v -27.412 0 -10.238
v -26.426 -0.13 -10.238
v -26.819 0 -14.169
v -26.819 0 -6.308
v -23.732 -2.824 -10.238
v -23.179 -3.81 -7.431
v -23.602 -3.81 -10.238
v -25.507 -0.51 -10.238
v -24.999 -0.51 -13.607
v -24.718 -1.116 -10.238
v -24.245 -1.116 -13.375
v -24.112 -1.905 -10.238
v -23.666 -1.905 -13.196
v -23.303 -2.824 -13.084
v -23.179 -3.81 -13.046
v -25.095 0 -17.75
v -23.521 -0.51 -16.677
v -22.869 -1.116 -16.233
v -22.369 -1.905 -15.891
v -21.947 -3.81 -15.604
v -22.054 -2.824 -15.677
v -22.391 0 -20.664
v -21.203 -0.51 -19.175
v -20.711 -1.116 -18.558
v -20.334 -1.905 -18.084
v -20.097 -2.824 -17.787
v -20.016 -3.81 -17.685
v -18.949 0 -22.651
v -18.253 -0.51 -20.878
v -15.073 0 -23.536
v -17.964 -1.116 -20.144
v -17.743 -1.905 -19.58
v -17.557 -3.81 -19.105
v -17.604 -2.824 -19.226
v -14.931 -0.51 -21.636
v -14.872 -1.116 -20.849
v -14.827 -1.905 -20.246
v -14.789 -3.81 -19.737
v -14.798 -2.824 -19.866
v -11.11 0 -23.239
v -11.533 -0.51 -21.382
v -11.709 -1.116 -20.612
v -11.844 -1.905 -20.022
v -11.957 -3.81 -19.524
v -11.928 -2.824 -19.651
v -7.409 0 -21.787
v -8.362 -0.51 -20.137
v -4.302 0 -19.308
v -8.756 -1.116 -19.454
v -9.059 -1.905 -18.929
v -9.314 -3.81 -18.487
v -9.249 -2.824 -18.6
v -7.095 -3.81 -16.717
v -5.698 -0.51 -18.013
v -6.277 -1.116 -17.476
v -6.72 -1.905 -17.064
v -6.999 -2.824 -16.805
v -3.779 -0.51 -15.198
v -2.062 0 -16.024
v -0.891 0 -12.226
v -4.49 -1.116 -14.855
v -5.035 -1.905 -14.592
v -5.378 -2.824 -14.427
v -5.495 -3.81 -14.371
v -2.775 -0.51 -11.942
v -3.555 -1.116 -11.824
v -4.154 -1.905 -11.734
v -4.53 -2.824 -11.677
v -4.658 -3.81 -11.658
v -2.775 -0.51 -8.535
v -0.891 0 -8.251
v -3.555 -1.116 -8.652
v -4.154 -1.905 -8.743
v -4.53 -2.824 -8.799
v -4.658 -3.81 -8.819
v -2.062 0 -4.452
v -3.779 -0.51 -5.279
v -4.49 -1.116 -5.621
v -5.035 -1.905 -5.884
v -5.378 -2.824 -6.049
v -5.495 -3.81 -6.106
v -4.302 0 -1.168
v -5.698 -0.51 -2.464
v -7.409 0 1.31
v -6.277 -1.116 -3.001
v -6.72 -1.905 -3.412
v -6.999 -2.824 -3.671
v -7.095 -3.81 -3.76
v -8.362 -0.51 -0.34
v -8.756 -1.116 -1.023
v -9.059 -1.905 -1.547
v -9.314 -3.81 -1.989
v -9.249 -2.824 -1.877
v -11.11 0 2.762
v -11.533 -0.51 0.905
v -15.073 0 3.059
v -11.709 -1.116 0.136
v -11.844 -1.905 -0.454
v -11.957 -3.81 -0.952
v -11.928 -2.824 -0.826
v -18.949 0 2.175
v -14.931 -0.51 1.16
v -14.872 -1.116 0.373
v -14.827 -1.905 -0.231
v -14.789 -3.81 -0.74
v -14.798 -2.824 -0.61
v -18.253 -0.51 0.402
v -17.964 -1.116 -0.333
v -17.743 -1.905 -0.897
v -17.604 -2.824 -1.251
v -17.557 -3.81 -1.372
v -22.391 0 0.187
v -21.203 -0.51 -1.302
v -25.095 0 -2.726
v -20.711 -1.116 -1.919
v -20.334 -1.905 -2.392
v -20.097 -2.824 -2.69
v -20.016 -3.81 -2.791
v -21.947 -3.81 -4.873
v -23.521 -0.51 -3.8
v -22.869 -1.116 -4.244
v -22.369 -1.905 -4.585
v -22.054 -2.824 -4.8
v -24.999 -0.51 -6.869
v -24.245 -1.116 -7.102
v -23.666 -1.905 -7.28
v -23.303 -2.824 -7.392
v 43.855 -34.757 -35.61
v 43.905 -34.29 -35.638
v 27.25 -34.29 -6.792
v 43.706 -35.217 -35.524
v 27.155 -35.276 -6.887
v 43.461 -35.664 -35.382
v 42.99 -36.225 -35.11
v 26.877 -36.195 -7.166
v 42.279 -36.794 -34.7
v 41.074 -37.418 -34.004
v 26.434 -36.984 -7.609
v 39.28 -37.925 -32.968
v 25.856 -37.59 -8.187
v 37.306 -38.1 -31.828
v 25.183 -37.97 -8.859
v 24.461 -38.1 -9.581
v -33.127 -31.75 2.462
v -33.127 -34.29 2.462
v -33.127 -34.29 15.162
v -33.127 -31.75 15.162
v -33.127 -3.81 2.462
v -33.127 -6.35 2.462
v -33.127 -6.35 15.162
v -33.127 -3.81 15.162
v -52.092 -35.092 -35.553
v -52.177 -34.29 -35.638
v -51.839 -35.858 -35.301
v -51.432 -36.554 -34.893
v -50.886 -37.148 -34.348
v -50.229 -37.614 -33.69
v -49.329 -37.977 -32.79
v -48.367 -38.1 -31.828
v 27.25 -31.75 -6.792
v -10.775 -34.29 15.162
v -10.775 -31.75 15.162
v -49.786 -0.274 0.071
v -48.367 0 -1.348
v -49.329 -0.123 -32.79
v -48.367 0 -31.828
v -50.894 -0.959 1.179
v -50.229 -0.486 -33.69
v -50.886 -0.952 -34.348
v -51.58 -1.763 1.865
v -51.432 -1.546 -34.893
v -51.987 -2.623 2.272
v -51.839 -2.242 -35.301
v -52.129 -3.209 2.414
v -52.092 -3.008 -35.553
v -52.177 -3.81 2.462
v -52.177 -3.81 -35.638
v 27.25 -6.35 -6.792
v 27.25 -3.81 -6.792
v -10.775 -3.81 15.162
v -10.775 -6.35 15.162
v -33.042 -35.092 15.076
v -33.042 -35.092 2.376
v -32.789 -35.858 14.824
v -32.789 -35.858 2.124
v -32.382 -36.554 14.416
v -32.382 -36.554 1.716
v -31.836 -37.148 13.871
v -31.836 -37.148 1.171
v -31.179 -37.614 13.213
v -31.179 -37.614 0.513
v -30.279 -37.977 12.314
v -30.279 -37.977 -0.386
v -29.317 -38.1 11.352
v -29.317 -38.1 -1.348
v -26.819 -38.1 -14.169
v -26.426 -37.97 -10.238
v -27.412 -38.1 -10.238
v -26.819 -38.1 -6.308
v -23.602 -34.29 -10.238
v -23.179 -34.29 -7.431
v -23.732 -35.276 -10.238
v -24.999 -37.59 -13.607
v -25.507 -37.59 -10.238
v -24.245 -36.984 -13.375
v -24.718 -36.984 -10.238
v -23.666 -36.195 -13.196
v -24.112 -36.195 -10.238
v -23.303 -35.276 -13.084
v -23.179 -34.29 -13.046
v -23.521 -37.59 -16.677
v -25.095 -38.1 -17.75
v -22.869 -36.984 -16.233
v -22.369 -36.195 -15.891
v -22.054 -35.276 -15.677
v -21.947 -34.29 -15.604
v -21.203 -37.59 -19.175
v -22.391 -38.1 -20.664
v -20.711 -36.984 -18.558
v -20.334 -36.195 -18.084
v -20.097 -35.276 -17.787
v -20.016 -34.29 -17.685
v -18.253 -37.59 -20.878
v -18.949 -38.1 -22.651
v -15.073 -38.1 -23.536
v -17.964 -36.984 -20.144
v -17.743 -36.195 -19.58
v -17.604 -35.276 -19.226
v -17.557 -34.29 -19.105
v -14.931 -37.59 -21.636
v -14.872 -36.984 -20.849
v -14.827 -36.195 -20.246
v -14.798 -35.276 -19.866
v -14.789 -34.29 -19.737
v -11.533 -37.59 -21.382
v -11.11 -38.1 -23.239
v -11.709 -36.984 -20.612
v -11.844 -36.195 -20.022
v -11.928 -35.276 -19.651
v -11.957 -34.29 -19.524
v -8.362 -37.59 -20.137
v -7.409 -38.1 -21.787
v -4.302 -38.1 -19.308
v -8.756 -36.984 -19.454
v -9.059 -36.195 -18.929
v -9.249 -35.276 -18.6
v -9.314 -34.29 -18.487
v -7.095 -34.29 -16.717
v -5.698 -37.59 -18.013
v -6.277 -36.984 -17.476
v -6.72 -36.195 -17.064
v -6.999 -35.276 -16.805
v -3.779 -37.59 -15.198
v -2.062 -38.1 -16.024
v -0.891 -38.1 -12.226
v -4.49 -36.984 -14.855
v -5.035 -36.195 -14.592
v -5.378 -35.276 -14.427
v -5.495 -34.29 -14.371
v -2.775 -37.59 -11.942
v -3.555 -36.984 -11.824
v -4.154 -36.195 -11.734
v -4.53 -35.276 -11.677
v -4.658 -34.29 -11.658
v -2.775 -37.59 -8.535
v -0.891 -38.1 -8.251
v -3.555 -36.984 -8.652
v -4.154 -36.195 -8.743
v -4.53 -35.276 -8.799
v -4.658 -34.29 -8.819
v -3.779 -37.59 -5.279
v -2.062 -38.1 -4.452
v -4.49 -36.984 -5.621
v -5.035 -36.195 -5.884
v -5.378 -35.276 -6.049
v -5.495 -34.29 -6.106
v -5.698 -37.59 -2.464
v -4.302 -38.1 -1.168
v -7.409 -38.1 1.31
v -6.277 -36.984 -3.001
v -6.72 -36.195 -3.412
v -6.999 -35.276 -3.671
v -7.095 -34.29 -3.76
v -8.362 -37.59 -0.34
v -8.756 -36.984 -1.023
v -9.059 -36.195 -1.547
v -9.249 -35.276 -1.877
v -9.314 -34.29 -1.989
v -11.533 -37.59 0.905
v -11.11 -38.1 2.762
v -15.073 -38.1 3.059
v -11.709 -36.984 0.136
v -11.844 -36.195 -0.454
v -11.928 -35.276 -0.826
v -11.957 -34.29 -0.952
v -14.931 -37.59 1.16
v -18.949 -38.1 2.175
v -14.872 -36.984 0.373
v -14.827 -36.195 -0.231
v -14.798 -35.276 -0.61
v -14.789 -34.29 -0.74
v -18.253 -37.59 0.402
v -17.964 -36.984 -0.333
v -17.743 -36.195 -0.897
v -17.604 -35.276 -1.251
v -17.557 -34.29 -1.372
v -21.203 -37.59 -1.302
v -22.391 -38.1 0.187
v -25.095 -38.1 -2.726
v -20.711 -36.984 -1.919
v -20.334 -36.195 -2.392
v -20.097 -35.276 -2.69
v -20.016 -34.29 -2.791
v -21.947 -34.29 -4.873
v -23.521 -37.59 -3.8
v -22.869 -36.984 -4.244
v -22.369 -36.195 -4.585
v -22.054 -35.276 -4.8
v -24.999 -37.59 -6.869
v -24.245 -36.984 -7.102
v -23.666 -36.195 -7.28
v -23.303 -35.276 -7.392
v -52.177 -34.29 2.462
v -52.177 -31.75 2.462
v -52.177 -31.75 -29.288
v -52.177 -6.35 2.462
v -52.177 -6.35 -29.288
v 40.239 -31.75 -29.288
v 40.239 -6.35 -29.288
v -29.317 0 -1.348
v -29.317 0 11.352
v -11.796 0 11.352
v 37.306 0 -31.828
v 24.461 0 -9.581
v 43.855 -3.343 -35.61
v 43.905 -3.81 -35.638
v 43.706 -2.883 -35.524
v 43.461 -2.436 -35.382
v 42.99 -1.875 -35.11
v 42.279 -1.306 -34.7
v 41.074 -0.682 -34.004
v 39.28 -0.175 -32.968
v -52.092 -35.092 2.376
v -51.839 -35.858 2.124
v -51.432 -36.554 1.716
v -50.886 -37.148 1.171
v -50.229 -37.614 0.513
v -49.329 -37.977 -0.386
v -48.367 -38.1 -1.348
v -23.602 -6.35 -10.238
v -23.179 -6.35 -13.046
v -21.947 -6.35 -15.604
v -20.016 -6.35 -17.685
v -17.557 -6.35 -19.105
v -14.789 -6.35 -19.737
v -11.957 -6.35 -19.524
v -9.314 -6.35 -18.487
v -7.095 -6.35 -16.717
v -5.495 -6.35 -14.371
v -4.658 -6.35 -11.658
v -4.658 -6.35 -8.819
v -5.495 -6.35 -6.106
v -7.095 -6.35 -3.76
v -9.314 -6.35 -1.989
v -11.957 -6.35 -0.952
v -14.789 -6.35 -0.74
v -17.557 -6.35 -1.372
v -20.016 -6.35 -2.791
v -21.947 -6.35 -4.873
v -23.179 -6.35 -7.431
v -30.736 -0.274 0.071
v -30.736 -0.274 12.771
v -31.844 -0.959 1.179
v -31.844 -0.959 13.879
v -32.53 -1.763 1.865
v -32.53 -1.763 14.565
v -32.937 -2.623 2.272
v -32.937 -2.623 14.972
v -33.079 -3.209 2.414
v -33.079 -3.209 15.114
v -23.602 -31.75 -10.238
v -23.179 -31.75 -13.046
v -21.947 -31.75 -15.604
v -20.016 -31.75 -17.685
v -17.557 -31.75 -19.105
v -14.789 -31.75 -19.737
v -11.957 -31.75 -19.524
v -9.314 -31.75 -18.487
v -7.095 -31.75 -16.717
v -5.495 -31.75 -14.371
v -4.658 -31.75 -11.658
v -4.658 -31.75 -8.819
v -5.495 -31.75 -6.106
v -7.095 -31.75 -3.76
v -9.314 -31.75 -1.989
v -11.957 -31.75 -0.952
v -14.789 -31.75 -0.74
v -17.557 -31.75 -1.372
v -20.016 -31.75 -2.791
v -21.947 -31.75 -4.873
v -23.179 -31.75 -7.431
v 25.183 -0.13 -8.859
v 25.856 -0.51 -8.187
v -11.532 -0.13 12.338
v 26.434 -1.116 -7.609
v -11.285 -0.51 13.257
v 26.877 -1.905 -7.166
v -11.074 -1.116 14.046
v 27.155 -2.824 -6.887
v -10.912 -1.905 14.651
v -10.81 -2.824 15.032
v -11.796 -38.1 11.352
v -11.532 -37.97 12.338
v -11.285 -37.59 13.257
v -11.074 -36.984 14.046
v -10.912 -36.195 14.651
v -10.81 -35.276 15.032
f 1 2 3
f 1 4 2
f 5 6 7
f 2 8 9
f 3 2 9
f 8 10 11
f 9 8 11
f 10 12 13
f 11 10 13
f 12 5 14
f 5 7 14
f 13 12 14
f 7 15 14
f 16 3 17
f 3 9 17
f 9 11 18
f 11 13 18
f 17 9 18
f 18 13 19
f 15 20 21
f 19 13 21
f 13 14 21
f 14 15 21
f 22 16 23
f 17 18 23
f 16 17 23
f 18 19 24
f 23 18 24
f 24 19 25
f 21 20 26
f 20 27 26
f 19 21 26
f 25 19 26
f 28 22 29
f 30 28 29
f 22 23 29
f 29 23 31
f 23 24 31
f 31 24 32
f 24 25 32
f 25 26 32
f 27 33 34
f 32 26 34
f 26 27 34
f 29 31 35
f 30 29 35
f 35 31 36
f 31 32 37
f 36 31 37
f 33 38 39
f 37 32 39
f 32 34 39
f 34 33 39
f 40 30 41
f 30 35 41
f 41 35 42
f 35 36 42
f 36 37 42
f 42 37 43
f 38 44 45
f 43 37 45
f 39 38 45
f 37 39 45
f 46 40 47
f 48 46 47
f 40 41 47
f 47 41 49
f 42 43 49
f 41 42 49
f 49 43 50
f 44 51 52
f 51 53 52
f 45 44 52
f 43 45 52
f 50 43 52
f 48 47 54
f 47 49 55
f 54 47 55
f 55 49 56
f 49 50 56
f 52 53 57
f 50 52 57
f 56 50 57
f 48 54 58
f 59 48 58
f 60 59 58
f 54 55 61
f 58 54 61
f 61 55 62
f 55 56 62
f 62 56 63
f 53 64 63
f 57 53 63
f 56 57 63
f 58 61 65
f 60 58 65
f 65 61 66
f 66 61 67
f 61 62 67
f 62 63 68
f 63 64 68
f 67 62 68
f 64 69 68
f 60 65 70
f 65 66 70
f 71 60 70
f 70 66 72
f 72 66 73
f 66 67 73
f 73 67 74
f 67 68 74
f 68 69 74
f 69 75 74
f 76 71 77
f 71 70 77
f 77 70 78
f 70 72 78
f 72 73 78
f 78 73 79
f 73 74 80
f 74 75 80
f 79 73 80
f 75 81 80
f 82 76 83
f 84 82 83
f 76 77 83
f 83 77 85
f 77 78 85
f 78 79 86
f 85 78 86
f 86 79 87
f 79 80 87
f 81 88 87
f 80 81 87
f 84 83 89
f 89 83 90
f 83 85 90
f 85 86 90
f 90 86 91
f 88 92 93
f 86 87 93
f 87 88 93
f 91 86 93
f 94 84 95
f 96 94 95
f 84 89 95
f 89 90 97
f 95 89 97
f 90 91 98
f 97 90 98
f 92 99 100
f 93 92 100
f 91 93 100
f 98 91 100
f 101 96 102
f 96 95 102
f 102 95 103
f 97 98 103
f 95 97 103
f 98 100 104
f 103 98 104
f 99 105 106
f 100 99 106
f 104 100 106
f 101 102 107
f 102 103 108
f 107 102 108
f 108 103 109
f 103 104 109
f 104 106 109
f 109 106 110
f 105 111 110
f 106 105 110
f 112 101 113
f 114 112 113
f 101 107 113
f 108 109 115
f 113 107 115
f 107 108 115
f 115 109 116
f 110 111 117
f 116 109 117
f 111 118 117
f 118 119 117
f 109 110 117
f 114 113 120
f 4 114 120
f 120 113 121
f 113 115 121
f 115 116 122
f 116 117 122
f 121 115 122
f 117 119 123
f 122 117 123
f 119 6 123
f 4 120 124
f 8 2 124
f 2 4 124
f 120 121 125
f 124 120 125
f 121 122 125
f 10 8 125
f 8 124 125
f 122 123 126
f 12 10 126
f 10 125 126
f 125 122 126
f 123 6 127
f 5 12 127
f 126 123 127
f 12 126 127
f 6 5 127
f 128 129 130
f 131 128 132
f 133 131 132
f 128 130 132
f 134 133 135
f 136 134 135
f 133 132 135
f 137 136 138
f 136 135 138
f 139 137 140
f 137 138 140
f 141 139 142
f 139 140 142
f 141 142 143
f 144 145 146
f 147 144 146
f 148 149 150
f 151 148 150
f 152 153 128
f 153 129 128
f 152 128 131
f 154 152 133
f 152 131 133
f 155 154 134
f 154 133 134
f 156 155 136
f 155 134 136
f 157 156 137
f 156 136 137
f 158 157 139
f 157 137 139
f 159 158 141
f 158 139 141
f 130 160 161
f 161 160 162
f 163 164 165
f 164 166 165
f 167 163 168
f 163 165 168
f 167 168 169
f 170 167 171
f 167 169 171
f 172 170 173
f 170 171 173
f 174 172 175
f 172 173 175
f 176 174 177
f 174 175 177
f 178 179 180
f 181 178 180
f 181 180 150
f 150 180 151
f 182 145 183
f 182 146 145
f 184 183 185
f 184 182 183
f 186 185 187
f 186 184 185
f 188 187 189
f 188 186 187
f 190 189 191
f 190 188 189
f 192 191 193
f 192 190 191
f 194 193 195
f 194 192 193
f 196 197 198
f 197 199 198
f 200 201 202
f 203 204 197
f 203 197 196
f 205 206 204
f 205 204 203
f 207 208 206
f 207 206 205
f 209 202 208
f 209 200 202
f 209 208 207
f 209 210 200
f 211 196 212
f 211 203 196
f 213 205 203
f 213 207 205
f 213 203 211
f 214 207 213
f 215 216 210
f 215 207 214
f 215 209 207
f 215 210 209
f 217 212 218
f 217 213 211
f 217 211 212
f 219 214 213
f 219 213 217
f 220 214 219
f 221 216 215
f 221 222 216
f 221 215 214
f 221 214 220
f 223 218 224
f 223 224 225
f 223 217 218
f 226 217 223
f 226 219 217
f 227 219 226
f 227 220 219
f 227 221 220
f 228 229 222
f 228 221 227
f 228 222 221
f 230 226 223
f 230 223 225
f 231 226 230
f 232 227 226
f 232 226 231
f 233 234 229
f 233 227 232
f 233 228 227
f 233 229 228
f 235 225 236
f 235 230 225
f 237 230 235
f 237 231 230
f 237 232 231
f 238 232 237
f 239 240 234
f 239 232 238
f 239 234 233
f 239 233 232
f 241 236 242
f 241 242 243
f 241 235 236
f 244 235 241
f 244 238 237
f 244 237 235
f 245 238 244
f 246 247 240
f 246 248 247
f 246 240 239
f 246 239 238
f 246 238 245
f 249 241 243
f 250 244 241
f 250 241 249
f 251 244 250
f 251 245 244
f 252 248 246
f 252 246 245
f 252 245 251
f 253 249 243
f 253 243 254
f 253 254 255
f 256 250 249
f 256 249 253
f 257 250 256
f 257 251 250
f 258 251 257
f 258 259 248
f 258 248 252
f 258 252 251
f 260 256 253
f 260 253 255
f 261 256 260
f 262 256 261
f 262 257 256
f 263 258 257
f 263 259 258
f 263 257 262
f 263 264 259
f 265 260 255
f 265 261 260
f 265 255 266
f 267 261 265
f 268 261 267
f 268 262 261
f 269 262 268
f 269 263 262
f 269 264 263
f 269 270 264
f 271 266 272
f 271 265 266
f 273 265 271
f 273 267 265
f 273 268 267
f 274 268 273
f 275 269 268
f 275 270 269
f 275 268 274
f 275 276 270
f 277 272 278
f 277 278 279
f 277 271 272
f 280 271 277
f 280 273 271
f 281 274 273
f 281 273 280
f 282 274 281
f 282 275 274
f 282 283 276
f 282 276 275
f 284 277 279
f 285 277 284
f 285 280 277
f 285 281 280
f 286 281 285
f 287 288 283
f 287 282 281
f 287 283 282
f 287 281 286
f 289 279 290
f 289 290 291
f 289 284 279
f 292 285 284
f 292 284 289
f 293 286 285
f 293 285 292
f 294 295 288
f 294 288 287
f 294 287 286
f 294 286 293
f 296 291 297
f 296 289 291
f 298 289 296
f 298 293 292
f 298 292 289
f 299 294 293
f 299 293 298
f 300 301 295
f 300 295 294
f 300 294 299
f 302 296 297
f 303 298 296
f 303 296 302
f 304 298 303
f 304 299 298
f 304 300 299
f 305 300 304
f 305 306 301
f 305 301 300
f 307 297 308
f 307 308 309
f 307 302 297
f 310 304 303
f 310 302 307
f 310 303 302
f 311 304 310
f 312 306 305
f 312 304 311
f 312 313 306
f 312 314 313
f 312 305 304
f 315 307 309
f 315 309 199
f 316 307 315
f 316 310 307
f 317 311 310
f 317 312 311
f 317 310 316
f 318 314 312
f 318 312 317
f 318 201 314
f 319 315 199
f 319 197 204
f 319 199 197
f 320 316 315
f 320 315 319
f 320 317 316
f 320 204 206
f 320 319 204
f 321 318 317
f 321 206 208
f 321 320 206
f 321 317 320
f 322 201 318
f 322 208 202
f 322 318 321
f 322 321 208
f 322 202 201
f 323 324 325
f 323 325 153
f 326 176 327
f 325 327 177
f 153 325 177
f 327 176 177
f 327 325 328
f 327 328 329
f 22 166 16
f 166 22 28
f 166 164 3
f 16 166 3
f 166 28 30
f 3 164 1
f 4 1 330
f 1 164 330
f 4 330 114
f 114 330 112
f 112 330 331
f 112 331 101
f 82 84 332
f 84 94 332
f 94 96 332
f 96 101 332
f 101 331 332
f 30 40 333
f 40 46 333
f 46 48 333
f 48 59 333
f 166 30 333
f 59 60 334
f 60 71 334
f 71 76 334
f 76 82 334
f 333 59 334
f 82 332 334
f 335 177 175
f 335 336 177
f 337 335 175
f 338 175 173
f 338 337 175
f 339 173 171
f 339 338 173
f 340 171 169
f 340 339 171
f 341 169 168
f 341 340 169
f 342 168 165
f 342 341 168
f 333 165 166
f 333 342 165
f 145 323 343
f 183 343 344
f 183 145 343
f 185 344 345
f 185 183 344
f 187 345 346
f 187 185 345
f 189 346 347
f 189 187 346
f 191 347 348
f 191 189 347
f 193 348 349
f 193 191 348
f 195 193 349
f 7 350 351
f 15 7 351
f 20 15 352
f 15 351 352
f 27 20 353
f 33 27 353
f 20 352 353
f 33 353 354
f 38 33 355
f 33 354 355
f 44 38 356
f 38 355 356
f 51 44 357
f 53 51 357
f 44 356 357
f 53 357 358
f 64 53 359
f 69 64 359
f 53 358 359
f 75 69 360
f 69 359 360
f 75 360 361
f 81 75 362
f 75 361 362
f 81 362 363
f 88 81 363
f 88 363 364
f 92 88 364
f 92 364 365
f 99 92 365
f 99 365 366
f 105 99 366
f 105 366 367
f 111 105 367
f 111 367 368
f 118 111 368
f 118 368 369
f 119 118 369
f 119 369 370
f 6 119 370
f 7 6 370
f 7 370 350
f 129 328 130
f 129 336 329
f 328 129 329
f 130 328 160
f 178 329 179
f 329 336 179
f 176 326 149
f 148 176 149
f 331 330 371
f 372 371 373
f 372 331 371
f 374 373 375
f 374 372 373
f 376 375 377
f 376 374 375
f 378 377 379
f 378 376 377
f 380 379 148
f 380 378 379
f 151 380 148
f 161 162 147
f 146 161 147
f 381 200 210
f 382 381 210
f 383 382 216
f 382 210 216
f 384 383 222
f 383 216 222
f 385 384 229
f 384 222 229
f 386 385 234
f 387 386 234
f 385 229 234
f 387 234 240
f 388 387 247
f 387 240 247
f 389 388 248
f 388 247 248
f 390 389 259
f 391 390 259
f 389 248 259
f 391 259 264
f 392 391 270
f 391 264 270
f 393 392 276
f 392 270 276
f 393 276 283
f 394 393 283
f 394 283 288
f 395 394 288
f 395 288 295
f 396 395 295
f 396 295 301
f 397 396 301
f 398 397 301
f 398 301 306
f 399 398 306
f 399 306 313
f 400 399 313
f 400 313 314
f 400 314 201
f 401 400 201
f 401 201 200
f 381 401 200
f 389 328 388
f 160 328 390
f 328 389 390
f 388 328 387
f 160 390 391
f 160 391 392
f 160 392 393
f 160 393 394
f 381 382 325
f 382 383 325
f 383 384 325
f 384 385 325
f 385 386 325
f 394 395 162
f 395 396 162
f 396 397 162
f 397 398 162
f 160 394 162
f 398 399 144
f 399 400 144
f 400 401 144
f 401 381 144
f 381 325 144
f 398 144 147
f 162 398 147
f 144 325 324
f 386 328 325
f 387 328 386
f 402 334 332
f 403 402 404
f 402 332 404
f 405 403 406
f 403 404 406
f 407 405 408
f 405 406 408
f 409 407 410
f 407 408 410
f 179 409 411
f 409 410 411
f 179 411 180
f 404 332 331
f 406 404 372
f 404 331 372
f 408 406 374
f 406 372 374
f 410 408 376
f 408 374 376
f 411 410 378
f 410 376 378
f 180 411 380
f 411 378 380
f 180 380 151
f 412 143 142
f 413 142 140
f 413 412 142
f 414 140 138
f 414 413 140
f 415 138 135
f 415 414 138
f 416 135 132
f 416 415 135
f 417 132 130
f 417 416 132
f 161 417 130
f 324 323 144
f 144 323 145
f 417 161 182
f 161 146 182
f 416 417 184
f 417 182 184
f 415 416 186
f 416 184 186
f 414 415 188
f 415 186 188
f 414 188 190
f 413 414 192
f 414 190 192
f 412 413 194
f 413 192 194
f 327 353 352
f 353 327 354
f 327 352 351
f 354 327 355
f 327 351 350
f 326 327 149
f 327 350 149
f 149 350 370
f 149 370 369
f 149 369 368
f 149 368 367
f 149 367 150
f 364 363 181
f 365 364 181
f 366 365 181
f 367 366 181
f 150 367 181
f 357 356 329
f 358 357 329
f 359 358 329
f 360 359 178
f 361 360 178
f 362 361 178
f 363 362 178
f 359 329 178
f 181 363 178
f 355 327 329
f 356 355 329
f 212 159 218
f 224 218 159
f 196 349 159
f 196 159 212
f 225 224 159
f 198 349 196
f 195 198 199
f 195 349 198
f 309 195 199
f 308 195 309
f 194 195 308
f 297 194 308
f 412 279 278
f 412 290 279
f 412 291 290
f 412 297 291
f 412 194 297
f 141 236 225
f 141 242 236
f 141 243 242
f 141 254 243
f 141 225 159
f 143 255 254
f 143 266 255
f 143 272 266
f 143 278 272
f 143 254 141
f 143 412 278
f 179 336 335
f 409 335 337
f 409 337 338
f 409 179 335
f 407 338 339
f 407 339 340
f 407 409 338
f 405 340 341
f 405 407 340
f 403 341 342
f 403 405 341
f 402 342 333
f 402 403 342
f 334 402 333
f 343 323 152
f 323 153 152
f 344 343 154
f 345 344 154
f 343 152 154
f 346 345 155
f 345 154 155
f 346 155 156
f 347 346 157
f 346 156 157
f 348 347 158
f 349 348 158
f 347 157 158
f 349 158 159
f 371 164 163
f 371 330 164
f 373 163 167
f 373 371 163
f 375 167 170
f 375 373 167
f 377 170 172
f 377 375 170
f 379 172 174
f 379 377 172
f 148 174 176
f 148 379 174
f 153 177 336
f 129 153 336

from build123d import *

# Parameters (mm, degrees)
F1_DEPTH = 38.1
F3_D     = 19.05
F4_W     = 19.05
F4_H     = 12.7
F5_DEPTH = 38.101
F6_W     = 25.4
F6_H     = 50.8172035844
F7_DEPTH = 52.1778825103
F8_DEPTH = 43.9057145722
F9_R     = 3.81
F10_R    = 3.81


with BuildPart() as f1:
    # F0 (on Front) → F1 (new body)
    with BuildSketch(Plane.XZ):
        Polygon((-10.7748825103, 15.1617240763), (-52.1768825103, 15.1617240763), (-52.1768825103, -35.6382759237), (43.9047145722, -35.6382759237), (27.2504226012, -6.7921960659), align=None)
    extrude(amount=F1_DEPTH)

    # F3 (through all)
    with Locations(Plane(origin=(0, 0, 0), x_dir=(1, 0, 0), z_dir=(0, 1, 0))):
        with Locations((-14.0768825103, 10.2382759237)):
            Hole(F3_D / 2)

    # F4 (on face) → F5 (cut, through all)
    with BuildSketch(Plane.XZ.offset(38.1)):
        with Locations((-42.6518825103, 8.8117240763)):
            Rectangle(F4_W, F4_H)
    extrude(amount=-F5_DEPTH, mode=Mode.SUBTRACT)

    # F6 (on Right) → F7 (cut, through all)
    with BuildSketch(Plane.YZ):
        with Locations((-19.05, -3.8796741316)):
            Rectangle(F6_W, F6_H)
    extrude(amount=-F7_DEPTH, mode=Mode.SUBTRACT)

    # F8 (cut, through all): a face of the model
    f8_faces = [f1.faces().sort_by_distance(p)[0] for p in [
        (0, -19.05, -10.1737165826),
    ]]
    extrude(f8_faces, amount=-F8_DEPTH, mode=Mode.SUBTRACT)

    # F9
    f9_edges = [f1.edges().sort_by_distance(p)[0] for p in [
        (8.23777, -38.1, 4.184764),
        (35.577569, -38.1, -21.215236),
        (-4.136084, -38.1, -35.638276),
        (-52.176883, -38.1, -16.588276),
        (-42.651883, -38.1, 2.461724),
        (-33.126883, -38.1, 8.811724),
        (-21.950883, -38.1, 15.161724),
        (-23.601883, -38.1, -10.238276),
    ]]
    fillet(f9_edges, radius=F9_R)

    # F10
    f10_edges = [f1.edges().sort_by_distance(p)[0] for p in [
        (8.23777, 0, 4.184764),
        (35.577569, 0, -21.215236),
        (-4.136084, 0, -35.638276),
        (-52.176883, 0, -16.588276),
        (-42.651883, 0, 2.461724),
        (-33.126883, 0, 8.811724),
        (-21.950883, 0, 15.161724),
        (-23.601883, 0, -10.238276),
    ]]
    fillet(f10_edges, radius=F10_R)


solid = f1.part
